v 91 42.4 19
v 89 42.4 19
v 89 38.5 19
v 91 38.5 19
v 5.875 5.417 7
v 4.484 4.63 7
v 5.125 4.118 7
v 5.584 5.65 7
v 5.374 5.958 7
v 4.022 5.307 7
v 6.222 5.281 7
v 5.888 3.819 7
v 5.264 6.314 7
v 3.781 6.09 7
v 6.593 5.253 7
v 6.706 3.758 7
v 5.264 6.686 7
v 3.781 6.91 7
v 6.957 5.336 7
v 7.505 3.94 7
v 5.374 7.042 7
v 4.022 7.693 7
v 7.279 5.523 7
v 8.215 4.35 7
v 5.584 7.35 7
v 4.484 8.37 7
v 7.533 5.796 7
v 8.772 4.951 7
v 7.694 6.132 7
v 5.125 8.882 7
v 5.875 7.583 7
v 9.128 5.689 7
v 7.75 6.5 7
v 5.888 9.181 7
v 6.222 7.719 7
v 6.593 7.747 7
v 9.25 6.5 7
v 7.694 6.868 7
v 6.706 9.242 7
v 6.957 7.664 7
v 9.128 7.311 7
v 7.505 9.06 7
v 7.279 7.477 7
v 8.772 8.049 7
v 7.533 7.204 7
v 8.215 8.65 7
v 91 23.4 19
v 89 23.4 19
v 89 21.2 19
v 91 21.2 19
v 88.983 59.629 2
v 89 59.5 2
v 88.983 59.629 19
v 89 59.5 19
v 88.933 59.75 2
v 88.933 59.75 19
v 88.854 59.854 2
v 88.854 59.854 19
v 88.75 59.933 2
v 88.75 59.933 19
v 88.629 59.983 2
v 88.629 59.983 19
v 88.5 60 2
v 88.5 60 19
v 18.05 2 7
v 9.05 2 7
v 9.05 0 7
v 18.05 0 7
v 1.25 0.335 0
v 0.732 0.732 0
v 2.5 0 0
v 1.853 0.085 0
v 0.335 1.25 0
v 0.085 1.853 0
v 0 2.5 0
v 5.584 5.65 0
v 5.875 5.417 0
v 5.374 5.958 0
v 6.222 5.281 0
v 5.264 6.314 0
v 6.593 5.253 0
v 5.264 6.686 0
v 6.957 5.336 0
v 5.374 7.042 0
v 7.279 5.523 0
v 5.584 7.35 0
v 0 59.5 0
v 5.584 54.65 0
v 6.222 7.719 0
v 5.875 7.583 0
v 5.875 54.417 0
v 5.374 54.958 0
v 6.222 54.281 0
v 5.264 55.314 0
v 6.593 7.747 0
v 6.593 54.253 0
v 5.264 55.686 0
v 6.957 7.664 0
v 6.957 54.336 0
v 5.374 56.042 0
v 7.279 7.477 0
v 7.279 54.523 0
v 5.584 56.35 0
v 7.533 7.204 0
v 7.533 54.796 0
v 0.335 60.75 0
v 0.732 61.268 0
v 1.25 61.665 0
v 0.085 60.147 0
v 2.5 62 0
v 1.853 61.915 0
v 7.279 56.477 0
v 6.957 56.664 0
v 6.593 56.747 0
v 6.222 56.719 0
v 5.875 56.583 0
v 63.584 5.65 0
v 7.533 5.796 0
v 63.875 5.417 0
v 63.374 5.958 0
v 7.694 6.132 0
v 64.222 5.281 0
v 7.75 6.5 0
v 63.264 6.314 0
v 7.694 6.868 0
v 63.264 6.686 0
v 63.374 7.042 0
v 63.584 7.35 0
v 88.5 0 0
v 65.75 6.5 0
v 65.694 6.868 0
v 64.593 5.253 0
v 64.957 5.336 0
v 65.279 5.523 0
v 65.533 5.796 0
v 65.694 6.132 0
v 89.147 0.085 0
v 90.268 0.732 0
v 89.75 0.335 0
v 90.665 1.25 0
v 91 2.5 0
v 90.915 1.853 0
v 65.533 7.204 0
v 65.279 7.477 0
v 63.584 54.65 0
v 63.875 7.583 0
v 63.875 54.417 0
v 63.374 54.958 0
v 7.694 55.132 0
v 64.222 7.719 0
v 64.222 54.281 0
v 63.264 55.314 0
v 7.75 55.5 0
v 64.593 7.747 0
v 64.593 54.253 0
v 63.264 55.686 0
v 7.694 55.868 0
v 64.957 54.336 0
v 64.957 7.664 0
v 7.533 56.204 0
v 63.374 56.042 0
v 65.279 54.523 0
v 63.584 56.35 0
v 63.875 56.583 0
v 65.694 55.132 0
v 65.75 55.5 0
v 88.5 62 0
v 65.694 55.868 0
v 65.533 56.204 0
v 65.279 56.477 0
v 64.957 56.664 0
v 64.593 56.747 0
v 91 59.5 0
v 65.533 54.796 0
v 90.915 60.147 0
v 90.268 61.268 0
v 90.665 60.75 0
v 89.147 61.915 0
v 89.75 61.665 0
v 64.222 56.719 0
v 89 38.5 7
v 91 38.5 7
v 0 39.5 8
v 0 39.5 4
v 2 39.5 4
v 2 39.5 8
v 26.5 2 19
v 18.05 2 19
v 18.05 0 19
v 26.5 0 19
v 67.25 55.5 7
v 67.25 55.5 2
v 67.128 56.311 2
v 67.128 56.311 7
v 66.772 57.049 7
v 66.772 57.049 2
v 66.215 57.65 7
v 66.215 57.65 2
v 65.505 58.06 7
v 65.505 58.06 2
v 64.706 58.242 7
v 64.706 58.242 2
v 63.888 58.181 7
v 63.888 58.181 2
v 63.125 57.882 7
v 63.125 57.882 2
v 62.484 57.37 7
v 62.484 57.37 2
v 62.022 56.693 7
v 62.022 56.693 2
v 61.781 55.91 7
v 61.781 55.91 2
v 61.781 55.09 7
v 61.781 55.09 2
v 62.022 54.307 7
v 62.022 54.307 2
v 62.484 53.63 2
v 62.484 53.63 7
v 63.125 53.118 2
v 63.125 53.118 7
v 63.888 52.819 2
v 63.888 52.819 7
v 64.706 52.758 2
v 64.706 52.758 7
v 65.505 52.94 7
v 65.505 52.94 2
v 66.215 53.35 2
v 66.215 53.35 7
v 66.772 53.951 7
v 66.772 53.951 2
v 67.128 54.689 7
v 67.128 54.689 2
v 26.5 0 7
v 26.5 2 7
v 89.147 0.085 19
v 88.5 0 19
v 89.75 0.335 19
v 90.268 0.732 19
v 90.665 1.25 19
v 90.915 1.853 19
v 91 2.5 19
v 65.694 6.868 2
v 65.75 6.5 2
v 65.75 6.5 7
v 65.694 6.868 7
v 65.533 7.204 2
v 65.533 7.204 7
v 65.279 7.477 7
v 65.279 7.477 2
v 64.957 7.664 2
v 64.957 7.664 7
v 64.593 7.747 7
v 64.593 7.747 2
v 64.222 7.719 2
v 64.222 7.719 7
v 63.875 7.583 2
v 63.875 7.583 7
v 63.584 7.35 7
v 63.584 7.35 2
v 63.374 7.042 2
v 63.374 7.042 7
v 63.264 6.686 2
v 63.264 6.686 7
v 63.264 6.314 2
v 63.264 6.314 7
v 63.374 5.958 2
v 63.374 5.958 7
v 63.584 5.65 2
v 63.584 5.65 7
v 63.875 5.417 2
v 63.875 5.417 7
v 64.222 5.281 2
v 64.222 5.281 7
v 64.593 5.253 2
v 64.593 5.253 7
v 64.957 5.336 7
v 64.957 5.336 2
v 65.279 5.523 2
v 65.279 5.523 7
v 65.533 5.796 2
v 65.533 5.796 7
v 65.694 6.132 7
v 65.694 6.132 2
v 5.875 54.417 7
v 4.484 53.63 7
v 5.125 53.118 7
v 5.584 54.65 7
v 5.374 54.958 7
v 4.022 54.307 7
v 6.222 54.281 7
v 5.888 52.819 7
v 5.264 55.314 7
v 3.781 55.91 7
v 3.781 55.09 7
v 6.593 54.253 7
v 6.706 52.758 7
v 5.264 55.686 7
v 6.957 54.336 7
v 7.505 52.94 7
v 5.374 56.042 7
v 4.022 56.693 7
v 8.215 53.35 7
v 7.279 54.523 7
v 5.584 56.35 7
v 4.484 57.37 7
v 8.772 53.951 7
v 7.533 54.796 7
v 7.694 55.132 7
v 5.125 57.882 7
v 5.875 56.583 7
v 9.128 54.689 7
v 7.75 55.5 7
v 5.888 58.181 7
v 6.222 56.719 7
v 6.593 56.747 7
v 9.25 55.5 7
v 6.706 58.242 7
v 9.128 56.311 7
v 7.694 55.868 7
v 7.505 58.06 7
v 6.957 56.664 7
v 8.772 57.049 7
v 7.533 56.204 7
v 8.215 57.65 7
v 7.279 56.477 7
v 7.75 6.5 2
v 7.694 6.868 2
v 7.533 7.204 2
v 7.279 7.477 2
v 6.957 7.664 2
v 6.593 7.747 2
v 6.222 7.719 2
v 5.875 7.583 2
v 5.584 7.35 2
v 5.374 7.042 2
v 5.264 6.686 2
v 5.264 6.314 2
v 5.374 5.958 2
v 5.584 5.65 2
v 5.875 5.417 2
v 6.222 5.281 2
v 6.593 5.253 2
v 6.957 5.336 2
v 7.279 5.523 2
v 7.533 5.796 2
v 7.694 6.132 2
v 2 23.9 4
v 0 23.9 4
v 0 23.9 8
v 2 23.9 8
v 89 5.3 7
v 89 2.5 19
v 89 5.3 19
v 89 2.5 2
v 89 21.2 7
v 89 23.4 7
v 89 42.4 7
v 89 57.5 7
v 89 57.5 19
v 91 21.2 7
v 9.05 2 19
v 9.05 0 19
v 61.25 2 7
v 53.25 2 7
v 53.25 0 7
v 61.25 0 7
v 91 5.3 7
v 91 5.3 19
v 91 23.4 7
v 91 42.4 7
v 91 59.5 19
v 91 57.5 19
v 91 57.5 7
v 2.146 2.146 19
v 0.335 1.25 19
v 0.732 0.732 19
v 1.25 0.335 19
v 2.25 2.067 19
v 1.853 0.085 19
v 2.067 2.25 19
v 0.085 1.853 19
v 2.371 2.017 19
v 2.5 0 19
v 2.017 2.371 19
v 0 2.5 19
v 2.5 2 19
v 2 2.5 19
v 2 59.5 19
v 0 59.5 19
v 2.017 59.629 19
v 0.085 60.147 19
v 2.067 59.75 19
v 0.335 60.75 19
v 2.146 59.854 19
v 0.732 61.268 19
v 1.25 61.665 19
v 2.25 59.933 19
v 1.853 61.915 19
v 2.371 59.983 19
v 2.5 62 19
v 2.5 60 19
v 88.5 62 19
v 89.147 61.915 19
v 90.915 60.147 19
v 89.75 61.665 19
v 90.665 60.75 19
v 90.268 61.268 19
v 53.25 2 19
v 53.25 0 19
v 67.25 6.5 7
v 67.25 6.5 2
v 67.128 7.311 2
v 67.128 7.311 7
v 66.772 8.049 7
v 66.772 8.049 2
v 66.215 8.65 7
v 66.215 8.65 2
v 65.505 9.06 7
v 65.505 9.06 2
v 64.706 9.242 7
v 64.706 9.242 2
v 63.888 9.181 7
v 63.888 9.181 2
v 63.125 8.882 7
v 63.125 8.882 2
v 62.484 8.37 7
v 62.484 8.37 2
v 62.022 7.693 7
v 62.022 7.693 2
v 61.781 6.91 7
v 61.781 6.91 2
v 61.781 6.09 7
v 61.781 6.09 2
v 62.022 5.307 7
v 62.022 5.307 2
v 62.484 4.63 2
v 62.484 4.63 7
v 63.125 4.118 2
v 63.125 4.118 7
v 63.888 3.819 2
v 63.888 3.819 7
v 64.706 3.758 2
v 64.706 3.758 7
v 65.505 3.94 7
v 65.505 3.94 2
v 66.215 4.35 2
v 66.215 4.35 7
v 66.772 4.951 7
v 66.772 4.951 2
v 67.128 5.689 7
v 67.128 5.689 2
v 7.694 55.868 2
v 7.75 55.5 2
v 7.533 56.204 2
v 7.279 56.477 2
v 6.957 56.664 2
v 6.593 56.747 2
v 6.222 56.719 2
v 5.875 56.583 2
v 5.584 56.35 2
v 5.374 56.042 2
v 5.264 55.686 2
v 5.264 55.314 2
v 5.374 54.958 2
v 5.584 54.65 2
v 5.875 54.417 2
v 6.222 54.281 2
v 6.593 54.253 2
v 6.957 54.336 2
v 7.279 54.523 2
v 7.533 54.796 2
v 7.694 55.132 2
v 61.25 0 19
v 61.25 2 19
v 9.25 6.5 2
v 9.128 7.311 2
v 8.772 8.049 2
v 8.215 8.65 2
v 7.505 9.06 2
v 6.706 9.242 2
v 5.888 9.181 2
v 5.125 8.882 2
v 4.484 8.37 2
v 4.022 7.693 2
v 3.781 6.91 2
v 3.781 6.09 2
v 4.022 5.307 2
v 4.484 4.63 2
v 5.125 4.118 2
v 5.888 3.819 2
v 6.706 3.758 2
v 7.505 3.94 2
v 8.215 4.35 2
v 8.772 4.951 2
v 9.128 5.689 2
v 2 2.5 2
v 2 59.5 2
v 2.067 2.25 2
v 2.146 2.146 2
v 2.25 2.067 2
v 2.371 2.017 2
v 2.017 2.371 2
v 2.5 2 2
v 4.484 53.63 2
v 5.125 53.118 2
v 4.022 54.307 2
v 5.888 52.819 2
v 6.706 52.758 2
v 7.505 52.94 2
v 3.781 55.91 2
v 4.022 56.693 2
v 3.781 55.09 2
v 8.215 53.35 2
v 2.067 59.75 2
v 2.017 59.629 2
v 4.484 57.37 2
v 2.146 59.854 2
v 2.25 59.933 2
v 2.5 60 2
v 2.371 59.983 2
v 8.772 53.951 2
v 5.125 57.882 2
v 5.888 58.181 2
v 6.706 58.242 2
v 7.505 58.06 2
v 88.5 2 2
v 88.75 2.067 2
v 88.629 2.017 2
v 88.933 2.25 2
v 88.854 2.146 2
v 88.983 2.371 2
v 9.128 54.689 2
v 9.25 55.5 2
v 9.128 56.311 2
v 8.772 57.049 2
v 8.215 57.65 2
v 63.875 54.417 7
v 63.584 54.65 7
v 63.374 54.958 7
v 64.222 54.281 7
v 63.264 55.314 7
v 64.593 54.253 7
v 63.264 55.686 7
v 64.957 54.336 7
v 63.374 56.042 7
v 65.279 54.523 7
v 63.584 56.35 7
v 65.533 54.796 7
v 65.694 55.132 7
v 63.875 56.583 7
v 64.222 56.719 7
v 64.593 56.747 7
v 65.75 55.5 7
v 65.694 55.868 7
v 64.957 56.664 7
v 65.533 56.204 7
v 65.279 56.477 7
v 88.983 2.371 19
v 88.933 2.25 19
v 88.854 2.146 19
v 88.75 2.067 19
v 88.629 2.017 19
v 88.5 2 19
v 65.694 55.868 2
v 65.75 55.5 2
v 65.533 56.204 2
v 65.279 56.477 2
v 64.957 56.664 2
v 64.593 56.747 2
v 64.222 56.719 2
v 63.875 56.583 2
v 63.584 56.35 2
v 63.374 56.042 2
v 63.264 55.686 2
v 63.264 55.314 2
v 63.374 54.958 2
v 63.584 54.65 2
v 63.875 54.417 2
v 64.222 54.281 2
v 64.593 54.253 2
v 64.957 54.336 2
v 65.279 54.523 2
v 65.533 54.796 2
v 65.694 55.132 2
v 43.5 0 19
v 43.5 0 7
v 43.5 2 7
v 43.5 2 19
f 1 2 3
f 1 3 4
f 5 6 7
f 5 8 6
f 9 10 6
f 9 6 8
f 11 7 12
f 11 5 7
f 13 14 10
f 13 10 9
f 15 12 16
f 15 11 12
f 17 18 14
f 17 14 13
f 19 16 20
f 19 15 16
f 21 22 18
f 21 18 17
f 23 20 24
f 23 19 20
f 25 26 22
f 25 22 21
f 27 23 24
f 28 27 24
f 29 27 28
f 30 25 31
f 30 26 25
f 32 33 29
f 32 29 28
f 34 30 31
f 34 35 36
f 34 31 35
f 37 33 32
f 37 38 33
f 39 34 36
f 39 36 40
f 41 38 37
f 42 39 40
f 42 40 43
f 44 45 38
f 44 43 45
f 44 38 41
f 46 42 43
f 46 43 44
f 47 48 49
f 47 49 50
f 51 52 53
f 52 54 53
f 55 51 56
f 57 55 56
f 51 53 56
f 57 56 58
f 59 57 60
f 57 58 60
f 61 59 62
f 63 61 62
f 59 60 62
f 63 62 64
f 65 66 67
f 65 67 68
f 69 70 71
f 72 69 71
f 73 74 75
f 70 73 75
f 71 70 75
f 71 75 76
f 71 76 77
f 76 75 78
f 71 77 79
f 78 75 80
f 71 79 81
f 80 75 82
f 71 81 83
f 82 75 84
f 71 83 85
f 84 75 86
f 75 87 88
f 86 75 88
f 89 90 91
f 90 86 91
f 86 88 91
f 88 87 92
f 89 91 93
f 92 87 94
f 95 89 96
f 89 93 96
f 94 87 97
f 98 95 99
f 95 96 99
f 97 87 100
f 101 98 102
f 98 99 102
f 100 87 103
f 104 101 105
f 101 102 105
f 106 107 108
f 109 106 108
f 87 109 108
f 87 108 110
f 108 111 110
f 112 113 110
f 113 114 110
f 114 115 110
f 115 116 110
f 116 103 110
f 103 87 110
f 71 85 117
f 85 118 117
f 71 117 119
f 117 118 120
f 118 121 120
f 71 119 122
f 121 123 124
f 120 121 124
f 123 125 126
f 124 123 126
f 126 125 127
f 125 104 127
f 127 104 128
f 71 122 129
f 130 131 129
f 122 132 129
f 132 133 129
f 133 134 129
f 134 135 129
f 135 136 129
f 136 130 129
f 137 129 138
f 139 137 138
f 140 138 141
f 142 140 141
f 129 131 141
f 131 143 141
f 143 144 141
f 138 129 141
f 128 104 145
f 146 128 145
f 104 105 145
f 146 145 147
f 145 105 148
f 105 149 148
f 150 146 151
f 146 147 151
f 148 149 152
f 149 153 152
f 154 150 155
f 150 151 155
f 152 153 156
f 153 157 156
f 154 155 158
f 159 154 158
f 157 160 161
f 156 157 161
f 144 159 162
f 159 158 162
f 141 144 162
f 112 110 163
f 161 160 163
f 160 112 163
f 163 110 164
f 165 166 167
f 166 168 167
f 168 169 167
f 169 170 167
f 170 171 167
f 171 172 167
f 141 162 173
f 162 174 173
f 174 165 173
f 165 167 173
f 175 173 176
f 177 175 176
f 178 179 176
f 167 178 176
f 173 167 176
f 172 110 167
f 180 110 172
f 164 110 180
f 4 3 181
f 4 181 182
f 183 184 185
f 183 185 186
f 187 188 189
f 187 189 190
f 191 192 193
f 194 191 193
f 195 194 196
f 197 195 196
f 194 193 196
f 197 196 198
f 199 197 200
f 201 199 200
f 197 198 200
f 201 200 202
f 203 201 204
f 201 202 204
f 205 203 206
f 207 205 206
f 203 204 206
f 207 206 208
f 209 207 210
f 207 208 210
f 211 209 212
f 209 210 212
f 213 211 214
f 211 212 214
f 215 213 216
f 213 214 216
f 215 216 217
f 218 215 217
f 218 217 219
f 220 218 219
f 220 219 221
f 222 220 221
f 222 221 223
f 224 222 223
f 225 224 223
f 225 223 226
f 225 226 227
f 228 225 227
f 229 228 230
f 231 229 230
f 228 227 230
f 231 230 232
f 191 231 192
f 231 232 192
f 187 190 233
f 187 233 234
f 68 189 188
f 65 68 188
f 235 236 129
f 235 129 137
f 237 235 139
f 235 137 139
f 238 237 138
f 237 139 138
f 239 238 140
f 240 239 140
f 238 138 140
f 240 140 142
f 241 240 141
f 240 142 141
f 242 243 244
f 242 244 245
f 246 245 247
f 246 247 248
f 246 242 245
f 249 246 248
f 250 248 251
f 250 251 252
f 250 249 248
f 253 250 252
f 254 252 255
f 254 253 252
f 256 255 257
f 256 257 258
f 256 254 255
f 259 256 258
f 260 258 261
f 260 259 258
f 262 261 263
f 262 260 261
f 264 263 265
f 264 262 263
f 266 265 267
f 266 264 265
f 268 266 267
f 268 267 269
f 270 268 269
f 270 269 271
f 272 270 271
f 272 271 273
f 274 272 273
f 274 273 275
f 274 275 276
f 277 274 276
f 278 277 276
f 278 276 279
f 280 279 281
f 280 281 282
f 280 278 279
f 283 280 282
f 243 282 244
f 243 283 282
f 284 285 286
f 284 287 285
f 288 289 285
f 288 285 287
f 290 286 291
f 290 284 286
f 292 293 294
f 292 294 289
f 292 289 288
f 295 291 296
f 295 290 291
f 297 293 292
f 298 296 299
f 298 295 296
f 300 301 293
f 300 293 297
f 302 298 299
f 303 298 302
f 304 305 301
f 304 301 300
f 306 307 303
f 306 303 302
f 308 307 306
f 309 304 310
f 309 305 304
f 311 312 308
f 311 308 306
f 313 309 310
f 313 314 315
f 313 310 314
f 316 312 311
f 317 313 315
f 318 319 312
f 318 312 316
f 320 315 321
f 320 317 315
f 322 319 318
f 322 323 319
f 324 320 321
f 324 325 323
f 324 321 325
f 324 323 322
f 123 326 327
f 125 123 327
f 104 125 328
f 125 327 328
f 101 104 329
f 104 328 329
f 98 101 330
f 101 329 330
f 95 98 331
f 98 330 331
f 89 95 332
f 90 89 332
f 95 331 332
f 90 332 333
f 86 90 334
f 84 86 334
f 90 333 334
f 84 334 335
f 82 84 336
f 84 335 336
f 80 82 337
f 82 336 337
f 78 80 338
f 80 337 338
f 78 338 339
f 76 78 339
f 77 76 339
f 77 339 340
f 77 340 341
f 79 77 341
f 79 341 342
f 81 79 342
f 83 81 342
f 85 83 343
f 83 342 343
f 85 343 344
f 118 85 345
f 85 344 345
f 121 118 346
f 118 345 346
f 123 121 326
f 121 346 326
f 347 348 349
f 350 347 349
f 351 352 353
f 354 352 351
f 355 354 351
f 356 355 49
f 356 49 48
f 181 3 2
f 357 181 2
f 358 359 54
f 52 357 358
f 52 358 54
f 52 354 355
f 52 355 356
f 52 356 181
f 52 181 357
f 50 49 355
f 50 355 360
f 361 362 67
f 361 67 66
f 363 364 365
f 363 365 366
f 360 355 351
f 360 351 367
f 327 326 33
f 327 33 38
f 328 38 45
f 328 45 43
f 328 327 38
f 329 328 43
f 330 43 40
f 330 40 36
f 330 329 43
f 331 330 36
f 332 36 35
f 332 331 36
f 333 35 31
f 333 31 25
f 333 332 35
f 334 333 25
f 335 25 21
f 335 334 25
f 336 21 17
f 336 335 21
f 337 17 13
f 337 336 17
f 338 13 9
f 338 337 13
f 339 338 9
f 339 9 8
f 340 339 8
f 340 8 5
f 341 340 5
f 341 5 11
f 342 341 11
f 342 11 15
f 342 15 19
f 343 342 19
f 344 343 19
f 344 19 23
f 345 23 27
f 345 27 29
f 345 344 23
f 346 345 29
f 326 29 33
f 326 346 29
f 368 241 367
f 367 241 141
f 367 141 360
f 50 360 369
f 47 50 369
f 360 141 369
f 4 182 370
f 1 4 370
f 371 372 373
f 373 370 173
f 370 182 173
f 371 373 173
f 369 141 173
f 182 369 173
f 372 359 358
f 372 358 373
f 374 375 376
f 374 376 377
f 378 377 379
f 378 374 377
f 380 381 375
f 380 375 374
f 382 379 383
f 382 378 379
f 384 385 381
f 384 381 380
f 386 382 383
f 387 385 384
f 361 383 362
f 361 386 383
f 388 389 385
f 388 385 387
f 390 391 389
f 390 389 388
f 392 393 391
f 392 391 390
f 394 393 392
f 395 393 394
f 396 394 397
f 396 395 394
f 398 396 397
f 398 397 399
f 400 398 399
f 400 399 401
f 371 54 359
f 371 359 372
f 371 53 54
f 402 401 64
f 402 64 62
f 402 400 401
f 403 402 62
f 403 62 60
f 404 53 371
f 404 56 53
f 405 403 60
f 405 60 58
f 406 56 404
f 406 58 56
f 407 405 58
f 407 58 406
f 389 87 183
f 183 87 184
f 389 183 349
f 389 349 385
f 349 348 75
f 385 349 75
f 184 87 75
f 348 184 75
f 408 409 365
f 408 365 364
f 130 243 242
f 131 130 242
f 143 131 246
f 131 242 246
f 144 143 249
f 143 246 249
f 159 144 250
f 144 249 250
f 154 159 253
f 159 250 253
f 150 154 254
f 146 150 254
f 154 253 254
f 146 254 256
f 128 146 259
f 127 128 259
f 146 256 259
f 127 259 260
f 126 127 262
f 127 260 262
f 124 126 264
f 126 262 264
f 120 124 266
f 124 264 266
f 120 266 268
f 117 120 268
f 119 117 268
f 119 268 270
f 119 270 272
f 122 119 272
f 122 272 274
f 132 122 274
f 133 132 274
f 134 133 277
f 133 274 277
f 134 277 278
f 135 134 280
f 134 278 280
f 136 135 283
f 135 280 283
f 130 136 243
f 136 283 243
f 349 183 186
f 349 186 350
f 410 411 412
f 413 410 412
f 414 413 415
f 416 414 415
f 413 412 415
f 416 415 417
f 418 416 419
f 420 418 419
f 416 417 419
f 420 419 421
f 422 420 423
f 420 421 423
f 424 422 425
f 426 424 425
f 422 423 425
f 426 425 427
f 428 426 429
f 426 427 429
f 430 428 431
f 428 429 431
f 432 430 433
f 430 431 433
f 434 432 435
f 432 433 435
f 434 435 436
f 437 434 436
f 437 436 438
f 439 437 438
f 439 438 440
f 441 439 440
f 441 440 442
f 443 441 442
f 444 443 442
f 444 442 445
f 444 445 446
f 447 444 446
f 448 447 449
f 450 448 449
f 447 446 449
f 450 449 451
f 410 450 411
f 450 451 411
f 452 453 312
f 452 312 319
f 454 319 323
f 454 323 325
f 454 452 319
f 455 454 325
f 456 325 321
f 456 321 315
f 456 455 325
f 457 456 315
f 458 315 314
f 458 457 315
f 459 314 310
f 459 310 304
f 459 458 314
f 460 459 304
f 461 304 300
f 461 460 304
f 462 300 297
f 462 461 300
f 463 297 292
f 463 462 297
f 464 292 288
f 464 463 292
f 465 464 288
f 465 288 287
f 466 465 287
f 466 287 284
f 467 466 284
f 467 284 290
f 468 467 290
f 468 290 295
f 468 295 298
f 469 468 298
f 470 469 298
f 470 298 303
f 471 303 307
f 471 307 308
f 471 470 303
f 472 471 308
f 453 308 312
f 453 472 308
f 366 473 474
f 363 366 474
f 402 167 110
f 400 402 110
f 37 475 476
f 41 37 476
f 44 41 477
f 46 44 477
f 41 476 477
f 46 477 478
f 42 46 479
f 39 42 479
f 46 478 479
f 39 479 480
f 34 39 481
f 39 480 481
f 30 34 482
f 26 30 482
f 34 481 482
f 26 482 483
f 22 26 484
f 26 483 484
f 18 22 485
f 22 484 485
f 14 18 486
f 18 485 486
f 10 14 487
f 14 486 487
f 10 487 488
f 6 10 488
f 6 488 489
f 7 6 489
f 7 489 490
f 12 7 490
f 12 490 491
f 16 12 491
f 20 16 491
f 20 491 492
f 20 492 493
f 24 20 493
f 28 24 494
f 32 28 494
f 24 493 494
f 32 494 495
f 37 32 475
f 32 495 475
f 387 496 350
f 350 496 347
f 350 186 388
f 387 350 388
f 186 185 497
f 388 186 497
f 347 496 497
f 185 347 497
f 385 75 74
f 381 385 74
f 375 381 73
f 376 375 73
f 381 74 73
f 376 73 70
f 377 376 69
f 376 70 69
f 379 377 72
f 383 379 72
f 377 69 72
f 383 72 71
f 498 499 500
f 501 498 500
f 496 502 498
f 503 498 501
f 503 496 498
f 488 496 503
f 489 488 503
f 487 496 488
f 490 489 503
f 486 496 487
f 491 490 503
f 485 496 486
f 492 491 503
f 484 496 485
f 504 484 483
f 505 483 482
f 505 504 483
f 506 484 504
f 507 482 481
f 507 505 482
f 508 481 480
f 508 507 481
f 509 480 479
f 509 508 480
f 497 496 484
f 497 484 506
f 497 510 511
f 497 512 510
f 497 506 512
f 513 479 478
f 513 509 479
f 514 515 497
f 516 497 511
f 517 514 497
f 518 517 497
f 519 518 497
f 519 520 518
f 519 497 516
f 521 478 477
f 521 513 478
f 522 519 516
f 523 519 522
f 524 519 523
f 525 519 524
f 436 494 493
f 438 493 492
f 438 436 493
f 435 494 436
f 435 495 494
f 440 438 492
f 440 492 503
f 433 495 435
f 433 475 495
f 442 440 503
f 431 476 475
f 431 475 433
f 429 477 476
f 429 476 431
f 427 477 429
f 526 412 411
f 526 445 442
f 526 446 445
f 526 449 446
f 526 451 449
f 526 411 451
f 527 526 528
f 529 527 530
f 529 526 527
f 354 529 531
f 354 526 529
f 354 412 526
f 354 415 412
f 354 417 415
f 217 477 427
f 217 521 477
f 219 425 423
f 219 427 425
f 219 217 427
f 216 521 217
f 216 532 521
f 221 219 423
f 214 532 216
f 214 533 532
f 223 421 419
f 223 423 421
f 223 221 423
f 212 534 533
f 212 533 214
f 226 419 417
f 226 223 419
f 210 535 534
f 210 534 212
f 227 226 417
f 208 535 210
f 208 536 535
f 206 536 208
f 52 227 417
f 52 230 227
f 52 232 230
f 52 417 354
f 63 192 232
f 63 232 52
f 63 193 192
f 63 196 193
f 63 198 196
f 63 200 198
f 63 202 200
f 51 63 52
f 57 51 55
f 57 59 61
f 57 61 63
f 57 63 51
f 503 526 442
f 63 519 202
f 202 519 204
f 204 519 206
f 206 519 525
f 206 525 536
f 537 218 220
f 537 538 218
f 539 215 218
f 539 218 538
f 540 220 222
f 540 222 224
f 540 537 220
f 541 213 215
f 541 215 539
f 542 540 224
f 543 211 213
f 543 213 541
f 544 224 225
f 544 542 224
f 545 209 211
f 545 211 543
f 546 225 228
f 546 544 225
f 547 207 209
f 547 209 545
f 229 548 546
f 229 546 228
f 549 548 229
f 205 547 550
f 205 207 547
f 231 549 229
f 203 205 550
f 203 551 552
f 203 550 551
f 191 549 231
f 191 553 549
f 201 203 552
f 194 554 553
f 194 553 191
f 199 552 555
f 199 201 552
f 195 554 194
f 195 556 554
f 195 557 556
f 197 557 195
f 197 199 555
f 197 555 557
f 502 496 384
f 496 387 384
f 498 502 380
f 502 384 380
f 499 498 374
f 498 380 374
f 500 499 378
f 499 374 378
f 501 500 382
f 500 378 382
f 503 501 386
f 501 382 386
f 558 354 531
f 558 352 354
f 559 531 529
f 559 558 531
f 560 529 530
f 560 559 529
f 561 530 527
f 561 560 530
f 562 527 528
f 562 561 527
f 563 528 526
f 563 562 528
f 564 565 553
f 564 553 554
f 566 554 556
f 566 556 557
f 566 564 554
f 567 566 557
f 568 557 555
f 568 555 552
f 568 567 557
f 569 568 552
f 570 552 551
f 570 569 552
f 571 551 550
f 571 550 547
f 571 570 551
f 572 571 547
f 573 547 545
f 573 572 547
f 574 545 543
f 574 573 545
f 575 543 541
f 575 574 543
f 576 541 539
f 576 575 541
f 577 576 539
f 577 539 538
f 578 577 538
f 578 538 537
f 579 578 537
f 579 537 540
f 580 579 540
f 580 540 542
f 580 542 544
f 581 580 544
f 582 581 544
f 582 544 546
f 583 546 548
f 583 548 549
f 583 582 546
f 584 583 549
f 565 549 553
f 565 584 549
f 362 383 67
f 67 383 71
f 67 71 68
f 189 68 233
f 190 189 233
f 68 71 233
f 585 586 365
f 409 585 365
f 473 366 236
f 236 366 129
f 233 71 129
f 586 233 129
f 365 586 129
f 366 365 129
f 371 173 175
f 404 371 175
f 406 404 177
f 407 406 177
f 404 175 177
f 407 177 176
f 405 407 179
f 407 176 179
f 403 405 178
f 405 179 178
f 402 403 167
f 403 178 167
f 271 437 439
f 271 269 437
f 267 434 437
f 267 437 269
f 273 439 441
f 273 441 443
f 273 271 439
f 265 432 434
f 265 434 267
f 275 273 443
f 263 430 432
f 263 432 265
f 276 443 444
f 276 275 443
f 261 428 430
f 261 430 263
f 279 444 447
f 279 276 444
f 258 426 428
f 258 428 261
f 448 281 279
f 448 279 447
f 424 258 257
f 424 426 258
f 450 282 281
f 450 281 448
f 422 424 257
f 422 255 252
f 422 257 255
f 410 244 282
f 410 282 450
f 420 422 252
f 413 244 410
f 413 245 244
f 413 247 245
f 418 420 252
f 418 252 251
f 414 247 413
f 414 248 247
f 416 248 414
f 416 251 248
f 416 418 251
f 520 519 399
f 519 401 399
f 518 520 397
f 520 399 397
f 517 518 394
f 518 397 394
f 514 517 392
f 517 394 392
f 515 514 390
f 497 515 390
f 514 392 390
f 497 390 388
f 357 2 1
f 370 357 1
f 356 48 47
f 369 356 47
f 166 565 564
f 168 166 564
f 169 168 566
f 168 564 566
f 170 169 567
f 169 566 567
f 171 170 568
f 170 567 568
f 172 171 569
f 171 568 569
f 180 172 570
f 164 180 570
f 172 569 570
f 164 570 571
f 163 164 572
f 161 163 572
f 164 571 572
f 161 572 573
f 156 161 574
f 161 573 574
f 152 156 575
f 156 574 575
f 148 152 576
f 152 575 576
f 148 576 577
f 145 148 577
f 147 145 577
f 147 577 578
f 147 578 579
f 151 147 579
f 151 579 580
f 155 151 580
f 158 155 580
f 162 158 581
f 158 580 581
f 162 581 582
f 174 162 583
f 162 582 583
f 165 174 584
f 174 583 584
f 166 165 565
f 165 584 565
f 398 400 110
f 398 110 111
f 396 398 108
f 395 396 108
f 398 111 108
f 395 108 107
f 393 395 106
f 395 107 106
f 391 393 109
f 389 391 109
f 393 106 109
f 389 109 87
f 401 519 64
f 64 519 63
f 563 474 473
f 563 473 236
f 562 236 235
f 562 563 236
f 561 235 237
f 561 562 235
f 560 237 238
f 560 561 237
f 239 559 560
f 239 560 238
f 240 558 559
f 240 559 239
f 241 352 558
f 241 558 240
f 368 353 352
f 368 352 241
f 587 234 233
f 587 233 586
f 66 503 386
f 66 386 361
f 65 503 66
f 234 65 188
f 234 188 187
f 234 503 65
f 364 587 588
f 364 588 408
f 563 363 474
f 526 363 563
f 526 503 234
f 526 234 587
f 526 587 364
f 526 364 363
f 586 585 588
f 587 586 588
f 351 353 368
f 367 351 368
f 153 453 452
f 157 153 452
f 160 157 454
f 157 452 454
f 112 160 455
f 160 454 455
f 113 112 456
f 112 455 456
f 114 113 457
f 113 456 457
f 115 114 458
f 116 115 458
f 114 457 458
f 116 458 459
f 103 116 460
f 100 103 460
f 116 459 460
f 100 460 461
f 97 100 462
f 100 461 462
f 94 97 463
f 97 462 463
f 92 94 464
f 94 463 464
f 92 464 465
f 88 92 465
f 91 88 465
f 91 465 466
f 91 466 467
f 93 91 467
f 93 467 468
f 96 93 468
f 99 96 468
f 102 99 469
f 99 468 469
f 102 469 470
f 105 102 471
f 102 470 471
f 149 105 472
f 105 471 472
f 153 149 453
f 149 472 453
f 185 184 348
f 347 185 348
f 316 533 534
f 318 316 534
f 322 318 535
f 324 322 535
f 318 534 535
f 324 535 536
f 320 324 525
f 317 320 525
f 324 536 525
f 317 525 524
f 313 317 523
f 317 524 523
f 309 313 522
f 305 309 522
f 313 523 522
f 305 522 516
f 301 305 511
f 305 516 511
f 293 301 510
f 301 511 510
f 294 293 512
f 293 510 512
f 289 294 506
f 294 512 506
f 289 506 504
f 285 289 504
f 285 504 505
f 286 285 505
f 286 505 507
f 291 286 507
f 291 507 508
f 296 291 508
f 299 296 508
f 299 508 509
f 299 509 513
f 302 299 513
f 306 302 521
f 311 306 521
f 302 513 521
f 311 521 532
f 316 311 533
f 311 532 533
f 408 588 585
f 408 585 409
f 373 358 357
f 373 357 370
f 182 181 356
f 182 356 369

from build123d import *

# Parameters (mm, degrees)
F0_W      = 87
F0_H      = 58
F1_DEPTH  = 2
F2_DEPTH  = 19
F3_R      = 2.75
F3_R_2    = 1.25
F4_DEPTH  = 5
F5_W      = 9
F5_H      = 2
F5_W_2    = 17
F5_W_3    = 8
F5_W_4    = 2
F5_H_2    = 15.9
F5_H_3    = 15.1
F6_DEPTH  = 12
F7_W      = 15.6
F7_H      = 4
F8_DEPTH  = 5
F9_R      = 0.5
F10_DEPTH = 2


with BuildPart() as f1:
    # F0 (on Top) → F1 (new body)
    with BuildSketch(Plane.XY):
        with BuildLine():
            ThreePointArc((0, 2.5), (0.732233047, 0.732233047), (2.5, 0))
            Line((2.5, 0), (88.5, 0))
            ThreePointArc((88.5, 0), (90.267766953, 0.732233047), (91, 2.5))
            Line((91, 2.5), (91, 59.5))
            ThreePointArc((91, 59.5), (90.267766953, 61.267766953), (88.5, 62))
            Line((88.5, 62), (2.5, 62))
            ThreePointArc((2.5, 62), (0.732233047, 61.267766953), (0, 59.5))
            Line((0, 59.5), (0, 2.5))
        make_face()
        with Locations((45.5, 31)):
            Rectangle(F0_W, F0_H, mode=Mode.SUBTRACT)
        with Locations((45.5, 31)):
            Rectangle(F0_W, F0_H)
    extrude(amount=F1_DEPTH)

    # F0 (on Top) → F2 (join)
    with BuildSketch(Plane.XY):
        with BuildLine():
            ThreePointArc((0, 2.5), (0.732233047, 0.732233047), (2.5, 0))
            Line((2.5, 0), (88.5, 0))
            ThreePointArc((88.5, 0), (90.267766953, 0.732233047), (91, 2.5))
            Line((91, 2.5), (91, 59.5))
            ThreePointArc((91, 59.5), (90.267766953, 61.267766953), (88.5, 62))
            Line((88.5, 62), (2.5, 62))
            ThreePointArc((2.5, 62), (0.732233047, 61.267766953), (0, 59.5))
            Line((0, 59.5), (0, 2.5))
        make_face()
        with Locations((45.5, 31)):
            Rectangle(F0_W, F0_H, mode=Mode.SUBTRACT)
    extrude(amount=F2_DEPTH)

    # F3 (on face) → F4 (join)
    with BuildSketch(Plane.XY.offset(2)):
        with Locations((6.5, 55.5)):
            Circle(F3_R)
        with Locations((6.5, 55.5)):
            Circle(F3_R_2, mode=Mode.SUBTRACT)
        with Locations((64.5, 6.5)):
            Circle(F3_R)
        with Locations((64.5, 6.5)):
            Circle(F3_R_2, mode=Mode.SUBTRACT)
        with Locations((6.5, 6.5)):
            Circle(F3_R)
        with Locations((6.5, 6.5)):
            Circle(F3_R_2, mode=Mode.SUBTRACT)
        with Locations((64.5, 55.5)):
            Circle(F3_R)
        with Locations((64.5, 55.5)):
            Circle(F3_R_2, mode=Mode.SUBTRACT)
    extrude(amount=F4_DEPTH)

    # F5 (on face) → F6 (cut)
    with BuildSketch(Plane.XY.offset(19)):
        with Locations((13.55, 1)):
            Rectangle(F5_W, F5_H)
        with Locations((35, 1)):
            Rectangle(F5_W_2, F5_H)
        with Locations((57.25, 1)):
            Rectangle(F5_W_3, F5_H)
        with Locations((90, 13.25)):
            Rectangle(F5_W_4, F5_H_2)
        with Locations((90, 30.95)):
            Rectangle(F5_W_4, F5_H_3)
        with Locations((90, 49.95)):
            Rectangle(F5_W_4, F5_H_3)
    extrude(amount=-F6_DEPTH, mode=Mode.SUBTRACT)

    # F7 (on face) → F8 (cut)
    with BuildSketch(Plane(origin=(0, 0, 0), x_dir=(0, -1, 0), z_dir=(-1, 0, 0))):
        with Locations((-31.7, 6)):
            Rectangle(F7_W, F7_H)
    extrude(amount=-F8_DEPTH, mode=Mode.SUBTRACT)

    # F9
    f9_edges = [f1.edges().sort_by_distance(p)[0] for p in [
        (2, 60, 10.5),
        (89, 60, 10.5),
        (2, 2, 10.5),
        (89, 2, 10.5),
    ]]
    fillet(f9_edges, radius=F9_R)

    # F10 (cut, through all): faces of the model
    f10_faces = [f1.faces().sort_by_distance(p)[0] for p in [
        (6.5, 55.5, 2),
        (64.5, 55.5, 2),
        (64.5, 6.5, 2),
        (6.5, 6.5, 2),
    ]]
    extrude(f10_faces, amount=-F10_DEPTH, mode=Mode.SUBTRACT)


solid = f1.part
